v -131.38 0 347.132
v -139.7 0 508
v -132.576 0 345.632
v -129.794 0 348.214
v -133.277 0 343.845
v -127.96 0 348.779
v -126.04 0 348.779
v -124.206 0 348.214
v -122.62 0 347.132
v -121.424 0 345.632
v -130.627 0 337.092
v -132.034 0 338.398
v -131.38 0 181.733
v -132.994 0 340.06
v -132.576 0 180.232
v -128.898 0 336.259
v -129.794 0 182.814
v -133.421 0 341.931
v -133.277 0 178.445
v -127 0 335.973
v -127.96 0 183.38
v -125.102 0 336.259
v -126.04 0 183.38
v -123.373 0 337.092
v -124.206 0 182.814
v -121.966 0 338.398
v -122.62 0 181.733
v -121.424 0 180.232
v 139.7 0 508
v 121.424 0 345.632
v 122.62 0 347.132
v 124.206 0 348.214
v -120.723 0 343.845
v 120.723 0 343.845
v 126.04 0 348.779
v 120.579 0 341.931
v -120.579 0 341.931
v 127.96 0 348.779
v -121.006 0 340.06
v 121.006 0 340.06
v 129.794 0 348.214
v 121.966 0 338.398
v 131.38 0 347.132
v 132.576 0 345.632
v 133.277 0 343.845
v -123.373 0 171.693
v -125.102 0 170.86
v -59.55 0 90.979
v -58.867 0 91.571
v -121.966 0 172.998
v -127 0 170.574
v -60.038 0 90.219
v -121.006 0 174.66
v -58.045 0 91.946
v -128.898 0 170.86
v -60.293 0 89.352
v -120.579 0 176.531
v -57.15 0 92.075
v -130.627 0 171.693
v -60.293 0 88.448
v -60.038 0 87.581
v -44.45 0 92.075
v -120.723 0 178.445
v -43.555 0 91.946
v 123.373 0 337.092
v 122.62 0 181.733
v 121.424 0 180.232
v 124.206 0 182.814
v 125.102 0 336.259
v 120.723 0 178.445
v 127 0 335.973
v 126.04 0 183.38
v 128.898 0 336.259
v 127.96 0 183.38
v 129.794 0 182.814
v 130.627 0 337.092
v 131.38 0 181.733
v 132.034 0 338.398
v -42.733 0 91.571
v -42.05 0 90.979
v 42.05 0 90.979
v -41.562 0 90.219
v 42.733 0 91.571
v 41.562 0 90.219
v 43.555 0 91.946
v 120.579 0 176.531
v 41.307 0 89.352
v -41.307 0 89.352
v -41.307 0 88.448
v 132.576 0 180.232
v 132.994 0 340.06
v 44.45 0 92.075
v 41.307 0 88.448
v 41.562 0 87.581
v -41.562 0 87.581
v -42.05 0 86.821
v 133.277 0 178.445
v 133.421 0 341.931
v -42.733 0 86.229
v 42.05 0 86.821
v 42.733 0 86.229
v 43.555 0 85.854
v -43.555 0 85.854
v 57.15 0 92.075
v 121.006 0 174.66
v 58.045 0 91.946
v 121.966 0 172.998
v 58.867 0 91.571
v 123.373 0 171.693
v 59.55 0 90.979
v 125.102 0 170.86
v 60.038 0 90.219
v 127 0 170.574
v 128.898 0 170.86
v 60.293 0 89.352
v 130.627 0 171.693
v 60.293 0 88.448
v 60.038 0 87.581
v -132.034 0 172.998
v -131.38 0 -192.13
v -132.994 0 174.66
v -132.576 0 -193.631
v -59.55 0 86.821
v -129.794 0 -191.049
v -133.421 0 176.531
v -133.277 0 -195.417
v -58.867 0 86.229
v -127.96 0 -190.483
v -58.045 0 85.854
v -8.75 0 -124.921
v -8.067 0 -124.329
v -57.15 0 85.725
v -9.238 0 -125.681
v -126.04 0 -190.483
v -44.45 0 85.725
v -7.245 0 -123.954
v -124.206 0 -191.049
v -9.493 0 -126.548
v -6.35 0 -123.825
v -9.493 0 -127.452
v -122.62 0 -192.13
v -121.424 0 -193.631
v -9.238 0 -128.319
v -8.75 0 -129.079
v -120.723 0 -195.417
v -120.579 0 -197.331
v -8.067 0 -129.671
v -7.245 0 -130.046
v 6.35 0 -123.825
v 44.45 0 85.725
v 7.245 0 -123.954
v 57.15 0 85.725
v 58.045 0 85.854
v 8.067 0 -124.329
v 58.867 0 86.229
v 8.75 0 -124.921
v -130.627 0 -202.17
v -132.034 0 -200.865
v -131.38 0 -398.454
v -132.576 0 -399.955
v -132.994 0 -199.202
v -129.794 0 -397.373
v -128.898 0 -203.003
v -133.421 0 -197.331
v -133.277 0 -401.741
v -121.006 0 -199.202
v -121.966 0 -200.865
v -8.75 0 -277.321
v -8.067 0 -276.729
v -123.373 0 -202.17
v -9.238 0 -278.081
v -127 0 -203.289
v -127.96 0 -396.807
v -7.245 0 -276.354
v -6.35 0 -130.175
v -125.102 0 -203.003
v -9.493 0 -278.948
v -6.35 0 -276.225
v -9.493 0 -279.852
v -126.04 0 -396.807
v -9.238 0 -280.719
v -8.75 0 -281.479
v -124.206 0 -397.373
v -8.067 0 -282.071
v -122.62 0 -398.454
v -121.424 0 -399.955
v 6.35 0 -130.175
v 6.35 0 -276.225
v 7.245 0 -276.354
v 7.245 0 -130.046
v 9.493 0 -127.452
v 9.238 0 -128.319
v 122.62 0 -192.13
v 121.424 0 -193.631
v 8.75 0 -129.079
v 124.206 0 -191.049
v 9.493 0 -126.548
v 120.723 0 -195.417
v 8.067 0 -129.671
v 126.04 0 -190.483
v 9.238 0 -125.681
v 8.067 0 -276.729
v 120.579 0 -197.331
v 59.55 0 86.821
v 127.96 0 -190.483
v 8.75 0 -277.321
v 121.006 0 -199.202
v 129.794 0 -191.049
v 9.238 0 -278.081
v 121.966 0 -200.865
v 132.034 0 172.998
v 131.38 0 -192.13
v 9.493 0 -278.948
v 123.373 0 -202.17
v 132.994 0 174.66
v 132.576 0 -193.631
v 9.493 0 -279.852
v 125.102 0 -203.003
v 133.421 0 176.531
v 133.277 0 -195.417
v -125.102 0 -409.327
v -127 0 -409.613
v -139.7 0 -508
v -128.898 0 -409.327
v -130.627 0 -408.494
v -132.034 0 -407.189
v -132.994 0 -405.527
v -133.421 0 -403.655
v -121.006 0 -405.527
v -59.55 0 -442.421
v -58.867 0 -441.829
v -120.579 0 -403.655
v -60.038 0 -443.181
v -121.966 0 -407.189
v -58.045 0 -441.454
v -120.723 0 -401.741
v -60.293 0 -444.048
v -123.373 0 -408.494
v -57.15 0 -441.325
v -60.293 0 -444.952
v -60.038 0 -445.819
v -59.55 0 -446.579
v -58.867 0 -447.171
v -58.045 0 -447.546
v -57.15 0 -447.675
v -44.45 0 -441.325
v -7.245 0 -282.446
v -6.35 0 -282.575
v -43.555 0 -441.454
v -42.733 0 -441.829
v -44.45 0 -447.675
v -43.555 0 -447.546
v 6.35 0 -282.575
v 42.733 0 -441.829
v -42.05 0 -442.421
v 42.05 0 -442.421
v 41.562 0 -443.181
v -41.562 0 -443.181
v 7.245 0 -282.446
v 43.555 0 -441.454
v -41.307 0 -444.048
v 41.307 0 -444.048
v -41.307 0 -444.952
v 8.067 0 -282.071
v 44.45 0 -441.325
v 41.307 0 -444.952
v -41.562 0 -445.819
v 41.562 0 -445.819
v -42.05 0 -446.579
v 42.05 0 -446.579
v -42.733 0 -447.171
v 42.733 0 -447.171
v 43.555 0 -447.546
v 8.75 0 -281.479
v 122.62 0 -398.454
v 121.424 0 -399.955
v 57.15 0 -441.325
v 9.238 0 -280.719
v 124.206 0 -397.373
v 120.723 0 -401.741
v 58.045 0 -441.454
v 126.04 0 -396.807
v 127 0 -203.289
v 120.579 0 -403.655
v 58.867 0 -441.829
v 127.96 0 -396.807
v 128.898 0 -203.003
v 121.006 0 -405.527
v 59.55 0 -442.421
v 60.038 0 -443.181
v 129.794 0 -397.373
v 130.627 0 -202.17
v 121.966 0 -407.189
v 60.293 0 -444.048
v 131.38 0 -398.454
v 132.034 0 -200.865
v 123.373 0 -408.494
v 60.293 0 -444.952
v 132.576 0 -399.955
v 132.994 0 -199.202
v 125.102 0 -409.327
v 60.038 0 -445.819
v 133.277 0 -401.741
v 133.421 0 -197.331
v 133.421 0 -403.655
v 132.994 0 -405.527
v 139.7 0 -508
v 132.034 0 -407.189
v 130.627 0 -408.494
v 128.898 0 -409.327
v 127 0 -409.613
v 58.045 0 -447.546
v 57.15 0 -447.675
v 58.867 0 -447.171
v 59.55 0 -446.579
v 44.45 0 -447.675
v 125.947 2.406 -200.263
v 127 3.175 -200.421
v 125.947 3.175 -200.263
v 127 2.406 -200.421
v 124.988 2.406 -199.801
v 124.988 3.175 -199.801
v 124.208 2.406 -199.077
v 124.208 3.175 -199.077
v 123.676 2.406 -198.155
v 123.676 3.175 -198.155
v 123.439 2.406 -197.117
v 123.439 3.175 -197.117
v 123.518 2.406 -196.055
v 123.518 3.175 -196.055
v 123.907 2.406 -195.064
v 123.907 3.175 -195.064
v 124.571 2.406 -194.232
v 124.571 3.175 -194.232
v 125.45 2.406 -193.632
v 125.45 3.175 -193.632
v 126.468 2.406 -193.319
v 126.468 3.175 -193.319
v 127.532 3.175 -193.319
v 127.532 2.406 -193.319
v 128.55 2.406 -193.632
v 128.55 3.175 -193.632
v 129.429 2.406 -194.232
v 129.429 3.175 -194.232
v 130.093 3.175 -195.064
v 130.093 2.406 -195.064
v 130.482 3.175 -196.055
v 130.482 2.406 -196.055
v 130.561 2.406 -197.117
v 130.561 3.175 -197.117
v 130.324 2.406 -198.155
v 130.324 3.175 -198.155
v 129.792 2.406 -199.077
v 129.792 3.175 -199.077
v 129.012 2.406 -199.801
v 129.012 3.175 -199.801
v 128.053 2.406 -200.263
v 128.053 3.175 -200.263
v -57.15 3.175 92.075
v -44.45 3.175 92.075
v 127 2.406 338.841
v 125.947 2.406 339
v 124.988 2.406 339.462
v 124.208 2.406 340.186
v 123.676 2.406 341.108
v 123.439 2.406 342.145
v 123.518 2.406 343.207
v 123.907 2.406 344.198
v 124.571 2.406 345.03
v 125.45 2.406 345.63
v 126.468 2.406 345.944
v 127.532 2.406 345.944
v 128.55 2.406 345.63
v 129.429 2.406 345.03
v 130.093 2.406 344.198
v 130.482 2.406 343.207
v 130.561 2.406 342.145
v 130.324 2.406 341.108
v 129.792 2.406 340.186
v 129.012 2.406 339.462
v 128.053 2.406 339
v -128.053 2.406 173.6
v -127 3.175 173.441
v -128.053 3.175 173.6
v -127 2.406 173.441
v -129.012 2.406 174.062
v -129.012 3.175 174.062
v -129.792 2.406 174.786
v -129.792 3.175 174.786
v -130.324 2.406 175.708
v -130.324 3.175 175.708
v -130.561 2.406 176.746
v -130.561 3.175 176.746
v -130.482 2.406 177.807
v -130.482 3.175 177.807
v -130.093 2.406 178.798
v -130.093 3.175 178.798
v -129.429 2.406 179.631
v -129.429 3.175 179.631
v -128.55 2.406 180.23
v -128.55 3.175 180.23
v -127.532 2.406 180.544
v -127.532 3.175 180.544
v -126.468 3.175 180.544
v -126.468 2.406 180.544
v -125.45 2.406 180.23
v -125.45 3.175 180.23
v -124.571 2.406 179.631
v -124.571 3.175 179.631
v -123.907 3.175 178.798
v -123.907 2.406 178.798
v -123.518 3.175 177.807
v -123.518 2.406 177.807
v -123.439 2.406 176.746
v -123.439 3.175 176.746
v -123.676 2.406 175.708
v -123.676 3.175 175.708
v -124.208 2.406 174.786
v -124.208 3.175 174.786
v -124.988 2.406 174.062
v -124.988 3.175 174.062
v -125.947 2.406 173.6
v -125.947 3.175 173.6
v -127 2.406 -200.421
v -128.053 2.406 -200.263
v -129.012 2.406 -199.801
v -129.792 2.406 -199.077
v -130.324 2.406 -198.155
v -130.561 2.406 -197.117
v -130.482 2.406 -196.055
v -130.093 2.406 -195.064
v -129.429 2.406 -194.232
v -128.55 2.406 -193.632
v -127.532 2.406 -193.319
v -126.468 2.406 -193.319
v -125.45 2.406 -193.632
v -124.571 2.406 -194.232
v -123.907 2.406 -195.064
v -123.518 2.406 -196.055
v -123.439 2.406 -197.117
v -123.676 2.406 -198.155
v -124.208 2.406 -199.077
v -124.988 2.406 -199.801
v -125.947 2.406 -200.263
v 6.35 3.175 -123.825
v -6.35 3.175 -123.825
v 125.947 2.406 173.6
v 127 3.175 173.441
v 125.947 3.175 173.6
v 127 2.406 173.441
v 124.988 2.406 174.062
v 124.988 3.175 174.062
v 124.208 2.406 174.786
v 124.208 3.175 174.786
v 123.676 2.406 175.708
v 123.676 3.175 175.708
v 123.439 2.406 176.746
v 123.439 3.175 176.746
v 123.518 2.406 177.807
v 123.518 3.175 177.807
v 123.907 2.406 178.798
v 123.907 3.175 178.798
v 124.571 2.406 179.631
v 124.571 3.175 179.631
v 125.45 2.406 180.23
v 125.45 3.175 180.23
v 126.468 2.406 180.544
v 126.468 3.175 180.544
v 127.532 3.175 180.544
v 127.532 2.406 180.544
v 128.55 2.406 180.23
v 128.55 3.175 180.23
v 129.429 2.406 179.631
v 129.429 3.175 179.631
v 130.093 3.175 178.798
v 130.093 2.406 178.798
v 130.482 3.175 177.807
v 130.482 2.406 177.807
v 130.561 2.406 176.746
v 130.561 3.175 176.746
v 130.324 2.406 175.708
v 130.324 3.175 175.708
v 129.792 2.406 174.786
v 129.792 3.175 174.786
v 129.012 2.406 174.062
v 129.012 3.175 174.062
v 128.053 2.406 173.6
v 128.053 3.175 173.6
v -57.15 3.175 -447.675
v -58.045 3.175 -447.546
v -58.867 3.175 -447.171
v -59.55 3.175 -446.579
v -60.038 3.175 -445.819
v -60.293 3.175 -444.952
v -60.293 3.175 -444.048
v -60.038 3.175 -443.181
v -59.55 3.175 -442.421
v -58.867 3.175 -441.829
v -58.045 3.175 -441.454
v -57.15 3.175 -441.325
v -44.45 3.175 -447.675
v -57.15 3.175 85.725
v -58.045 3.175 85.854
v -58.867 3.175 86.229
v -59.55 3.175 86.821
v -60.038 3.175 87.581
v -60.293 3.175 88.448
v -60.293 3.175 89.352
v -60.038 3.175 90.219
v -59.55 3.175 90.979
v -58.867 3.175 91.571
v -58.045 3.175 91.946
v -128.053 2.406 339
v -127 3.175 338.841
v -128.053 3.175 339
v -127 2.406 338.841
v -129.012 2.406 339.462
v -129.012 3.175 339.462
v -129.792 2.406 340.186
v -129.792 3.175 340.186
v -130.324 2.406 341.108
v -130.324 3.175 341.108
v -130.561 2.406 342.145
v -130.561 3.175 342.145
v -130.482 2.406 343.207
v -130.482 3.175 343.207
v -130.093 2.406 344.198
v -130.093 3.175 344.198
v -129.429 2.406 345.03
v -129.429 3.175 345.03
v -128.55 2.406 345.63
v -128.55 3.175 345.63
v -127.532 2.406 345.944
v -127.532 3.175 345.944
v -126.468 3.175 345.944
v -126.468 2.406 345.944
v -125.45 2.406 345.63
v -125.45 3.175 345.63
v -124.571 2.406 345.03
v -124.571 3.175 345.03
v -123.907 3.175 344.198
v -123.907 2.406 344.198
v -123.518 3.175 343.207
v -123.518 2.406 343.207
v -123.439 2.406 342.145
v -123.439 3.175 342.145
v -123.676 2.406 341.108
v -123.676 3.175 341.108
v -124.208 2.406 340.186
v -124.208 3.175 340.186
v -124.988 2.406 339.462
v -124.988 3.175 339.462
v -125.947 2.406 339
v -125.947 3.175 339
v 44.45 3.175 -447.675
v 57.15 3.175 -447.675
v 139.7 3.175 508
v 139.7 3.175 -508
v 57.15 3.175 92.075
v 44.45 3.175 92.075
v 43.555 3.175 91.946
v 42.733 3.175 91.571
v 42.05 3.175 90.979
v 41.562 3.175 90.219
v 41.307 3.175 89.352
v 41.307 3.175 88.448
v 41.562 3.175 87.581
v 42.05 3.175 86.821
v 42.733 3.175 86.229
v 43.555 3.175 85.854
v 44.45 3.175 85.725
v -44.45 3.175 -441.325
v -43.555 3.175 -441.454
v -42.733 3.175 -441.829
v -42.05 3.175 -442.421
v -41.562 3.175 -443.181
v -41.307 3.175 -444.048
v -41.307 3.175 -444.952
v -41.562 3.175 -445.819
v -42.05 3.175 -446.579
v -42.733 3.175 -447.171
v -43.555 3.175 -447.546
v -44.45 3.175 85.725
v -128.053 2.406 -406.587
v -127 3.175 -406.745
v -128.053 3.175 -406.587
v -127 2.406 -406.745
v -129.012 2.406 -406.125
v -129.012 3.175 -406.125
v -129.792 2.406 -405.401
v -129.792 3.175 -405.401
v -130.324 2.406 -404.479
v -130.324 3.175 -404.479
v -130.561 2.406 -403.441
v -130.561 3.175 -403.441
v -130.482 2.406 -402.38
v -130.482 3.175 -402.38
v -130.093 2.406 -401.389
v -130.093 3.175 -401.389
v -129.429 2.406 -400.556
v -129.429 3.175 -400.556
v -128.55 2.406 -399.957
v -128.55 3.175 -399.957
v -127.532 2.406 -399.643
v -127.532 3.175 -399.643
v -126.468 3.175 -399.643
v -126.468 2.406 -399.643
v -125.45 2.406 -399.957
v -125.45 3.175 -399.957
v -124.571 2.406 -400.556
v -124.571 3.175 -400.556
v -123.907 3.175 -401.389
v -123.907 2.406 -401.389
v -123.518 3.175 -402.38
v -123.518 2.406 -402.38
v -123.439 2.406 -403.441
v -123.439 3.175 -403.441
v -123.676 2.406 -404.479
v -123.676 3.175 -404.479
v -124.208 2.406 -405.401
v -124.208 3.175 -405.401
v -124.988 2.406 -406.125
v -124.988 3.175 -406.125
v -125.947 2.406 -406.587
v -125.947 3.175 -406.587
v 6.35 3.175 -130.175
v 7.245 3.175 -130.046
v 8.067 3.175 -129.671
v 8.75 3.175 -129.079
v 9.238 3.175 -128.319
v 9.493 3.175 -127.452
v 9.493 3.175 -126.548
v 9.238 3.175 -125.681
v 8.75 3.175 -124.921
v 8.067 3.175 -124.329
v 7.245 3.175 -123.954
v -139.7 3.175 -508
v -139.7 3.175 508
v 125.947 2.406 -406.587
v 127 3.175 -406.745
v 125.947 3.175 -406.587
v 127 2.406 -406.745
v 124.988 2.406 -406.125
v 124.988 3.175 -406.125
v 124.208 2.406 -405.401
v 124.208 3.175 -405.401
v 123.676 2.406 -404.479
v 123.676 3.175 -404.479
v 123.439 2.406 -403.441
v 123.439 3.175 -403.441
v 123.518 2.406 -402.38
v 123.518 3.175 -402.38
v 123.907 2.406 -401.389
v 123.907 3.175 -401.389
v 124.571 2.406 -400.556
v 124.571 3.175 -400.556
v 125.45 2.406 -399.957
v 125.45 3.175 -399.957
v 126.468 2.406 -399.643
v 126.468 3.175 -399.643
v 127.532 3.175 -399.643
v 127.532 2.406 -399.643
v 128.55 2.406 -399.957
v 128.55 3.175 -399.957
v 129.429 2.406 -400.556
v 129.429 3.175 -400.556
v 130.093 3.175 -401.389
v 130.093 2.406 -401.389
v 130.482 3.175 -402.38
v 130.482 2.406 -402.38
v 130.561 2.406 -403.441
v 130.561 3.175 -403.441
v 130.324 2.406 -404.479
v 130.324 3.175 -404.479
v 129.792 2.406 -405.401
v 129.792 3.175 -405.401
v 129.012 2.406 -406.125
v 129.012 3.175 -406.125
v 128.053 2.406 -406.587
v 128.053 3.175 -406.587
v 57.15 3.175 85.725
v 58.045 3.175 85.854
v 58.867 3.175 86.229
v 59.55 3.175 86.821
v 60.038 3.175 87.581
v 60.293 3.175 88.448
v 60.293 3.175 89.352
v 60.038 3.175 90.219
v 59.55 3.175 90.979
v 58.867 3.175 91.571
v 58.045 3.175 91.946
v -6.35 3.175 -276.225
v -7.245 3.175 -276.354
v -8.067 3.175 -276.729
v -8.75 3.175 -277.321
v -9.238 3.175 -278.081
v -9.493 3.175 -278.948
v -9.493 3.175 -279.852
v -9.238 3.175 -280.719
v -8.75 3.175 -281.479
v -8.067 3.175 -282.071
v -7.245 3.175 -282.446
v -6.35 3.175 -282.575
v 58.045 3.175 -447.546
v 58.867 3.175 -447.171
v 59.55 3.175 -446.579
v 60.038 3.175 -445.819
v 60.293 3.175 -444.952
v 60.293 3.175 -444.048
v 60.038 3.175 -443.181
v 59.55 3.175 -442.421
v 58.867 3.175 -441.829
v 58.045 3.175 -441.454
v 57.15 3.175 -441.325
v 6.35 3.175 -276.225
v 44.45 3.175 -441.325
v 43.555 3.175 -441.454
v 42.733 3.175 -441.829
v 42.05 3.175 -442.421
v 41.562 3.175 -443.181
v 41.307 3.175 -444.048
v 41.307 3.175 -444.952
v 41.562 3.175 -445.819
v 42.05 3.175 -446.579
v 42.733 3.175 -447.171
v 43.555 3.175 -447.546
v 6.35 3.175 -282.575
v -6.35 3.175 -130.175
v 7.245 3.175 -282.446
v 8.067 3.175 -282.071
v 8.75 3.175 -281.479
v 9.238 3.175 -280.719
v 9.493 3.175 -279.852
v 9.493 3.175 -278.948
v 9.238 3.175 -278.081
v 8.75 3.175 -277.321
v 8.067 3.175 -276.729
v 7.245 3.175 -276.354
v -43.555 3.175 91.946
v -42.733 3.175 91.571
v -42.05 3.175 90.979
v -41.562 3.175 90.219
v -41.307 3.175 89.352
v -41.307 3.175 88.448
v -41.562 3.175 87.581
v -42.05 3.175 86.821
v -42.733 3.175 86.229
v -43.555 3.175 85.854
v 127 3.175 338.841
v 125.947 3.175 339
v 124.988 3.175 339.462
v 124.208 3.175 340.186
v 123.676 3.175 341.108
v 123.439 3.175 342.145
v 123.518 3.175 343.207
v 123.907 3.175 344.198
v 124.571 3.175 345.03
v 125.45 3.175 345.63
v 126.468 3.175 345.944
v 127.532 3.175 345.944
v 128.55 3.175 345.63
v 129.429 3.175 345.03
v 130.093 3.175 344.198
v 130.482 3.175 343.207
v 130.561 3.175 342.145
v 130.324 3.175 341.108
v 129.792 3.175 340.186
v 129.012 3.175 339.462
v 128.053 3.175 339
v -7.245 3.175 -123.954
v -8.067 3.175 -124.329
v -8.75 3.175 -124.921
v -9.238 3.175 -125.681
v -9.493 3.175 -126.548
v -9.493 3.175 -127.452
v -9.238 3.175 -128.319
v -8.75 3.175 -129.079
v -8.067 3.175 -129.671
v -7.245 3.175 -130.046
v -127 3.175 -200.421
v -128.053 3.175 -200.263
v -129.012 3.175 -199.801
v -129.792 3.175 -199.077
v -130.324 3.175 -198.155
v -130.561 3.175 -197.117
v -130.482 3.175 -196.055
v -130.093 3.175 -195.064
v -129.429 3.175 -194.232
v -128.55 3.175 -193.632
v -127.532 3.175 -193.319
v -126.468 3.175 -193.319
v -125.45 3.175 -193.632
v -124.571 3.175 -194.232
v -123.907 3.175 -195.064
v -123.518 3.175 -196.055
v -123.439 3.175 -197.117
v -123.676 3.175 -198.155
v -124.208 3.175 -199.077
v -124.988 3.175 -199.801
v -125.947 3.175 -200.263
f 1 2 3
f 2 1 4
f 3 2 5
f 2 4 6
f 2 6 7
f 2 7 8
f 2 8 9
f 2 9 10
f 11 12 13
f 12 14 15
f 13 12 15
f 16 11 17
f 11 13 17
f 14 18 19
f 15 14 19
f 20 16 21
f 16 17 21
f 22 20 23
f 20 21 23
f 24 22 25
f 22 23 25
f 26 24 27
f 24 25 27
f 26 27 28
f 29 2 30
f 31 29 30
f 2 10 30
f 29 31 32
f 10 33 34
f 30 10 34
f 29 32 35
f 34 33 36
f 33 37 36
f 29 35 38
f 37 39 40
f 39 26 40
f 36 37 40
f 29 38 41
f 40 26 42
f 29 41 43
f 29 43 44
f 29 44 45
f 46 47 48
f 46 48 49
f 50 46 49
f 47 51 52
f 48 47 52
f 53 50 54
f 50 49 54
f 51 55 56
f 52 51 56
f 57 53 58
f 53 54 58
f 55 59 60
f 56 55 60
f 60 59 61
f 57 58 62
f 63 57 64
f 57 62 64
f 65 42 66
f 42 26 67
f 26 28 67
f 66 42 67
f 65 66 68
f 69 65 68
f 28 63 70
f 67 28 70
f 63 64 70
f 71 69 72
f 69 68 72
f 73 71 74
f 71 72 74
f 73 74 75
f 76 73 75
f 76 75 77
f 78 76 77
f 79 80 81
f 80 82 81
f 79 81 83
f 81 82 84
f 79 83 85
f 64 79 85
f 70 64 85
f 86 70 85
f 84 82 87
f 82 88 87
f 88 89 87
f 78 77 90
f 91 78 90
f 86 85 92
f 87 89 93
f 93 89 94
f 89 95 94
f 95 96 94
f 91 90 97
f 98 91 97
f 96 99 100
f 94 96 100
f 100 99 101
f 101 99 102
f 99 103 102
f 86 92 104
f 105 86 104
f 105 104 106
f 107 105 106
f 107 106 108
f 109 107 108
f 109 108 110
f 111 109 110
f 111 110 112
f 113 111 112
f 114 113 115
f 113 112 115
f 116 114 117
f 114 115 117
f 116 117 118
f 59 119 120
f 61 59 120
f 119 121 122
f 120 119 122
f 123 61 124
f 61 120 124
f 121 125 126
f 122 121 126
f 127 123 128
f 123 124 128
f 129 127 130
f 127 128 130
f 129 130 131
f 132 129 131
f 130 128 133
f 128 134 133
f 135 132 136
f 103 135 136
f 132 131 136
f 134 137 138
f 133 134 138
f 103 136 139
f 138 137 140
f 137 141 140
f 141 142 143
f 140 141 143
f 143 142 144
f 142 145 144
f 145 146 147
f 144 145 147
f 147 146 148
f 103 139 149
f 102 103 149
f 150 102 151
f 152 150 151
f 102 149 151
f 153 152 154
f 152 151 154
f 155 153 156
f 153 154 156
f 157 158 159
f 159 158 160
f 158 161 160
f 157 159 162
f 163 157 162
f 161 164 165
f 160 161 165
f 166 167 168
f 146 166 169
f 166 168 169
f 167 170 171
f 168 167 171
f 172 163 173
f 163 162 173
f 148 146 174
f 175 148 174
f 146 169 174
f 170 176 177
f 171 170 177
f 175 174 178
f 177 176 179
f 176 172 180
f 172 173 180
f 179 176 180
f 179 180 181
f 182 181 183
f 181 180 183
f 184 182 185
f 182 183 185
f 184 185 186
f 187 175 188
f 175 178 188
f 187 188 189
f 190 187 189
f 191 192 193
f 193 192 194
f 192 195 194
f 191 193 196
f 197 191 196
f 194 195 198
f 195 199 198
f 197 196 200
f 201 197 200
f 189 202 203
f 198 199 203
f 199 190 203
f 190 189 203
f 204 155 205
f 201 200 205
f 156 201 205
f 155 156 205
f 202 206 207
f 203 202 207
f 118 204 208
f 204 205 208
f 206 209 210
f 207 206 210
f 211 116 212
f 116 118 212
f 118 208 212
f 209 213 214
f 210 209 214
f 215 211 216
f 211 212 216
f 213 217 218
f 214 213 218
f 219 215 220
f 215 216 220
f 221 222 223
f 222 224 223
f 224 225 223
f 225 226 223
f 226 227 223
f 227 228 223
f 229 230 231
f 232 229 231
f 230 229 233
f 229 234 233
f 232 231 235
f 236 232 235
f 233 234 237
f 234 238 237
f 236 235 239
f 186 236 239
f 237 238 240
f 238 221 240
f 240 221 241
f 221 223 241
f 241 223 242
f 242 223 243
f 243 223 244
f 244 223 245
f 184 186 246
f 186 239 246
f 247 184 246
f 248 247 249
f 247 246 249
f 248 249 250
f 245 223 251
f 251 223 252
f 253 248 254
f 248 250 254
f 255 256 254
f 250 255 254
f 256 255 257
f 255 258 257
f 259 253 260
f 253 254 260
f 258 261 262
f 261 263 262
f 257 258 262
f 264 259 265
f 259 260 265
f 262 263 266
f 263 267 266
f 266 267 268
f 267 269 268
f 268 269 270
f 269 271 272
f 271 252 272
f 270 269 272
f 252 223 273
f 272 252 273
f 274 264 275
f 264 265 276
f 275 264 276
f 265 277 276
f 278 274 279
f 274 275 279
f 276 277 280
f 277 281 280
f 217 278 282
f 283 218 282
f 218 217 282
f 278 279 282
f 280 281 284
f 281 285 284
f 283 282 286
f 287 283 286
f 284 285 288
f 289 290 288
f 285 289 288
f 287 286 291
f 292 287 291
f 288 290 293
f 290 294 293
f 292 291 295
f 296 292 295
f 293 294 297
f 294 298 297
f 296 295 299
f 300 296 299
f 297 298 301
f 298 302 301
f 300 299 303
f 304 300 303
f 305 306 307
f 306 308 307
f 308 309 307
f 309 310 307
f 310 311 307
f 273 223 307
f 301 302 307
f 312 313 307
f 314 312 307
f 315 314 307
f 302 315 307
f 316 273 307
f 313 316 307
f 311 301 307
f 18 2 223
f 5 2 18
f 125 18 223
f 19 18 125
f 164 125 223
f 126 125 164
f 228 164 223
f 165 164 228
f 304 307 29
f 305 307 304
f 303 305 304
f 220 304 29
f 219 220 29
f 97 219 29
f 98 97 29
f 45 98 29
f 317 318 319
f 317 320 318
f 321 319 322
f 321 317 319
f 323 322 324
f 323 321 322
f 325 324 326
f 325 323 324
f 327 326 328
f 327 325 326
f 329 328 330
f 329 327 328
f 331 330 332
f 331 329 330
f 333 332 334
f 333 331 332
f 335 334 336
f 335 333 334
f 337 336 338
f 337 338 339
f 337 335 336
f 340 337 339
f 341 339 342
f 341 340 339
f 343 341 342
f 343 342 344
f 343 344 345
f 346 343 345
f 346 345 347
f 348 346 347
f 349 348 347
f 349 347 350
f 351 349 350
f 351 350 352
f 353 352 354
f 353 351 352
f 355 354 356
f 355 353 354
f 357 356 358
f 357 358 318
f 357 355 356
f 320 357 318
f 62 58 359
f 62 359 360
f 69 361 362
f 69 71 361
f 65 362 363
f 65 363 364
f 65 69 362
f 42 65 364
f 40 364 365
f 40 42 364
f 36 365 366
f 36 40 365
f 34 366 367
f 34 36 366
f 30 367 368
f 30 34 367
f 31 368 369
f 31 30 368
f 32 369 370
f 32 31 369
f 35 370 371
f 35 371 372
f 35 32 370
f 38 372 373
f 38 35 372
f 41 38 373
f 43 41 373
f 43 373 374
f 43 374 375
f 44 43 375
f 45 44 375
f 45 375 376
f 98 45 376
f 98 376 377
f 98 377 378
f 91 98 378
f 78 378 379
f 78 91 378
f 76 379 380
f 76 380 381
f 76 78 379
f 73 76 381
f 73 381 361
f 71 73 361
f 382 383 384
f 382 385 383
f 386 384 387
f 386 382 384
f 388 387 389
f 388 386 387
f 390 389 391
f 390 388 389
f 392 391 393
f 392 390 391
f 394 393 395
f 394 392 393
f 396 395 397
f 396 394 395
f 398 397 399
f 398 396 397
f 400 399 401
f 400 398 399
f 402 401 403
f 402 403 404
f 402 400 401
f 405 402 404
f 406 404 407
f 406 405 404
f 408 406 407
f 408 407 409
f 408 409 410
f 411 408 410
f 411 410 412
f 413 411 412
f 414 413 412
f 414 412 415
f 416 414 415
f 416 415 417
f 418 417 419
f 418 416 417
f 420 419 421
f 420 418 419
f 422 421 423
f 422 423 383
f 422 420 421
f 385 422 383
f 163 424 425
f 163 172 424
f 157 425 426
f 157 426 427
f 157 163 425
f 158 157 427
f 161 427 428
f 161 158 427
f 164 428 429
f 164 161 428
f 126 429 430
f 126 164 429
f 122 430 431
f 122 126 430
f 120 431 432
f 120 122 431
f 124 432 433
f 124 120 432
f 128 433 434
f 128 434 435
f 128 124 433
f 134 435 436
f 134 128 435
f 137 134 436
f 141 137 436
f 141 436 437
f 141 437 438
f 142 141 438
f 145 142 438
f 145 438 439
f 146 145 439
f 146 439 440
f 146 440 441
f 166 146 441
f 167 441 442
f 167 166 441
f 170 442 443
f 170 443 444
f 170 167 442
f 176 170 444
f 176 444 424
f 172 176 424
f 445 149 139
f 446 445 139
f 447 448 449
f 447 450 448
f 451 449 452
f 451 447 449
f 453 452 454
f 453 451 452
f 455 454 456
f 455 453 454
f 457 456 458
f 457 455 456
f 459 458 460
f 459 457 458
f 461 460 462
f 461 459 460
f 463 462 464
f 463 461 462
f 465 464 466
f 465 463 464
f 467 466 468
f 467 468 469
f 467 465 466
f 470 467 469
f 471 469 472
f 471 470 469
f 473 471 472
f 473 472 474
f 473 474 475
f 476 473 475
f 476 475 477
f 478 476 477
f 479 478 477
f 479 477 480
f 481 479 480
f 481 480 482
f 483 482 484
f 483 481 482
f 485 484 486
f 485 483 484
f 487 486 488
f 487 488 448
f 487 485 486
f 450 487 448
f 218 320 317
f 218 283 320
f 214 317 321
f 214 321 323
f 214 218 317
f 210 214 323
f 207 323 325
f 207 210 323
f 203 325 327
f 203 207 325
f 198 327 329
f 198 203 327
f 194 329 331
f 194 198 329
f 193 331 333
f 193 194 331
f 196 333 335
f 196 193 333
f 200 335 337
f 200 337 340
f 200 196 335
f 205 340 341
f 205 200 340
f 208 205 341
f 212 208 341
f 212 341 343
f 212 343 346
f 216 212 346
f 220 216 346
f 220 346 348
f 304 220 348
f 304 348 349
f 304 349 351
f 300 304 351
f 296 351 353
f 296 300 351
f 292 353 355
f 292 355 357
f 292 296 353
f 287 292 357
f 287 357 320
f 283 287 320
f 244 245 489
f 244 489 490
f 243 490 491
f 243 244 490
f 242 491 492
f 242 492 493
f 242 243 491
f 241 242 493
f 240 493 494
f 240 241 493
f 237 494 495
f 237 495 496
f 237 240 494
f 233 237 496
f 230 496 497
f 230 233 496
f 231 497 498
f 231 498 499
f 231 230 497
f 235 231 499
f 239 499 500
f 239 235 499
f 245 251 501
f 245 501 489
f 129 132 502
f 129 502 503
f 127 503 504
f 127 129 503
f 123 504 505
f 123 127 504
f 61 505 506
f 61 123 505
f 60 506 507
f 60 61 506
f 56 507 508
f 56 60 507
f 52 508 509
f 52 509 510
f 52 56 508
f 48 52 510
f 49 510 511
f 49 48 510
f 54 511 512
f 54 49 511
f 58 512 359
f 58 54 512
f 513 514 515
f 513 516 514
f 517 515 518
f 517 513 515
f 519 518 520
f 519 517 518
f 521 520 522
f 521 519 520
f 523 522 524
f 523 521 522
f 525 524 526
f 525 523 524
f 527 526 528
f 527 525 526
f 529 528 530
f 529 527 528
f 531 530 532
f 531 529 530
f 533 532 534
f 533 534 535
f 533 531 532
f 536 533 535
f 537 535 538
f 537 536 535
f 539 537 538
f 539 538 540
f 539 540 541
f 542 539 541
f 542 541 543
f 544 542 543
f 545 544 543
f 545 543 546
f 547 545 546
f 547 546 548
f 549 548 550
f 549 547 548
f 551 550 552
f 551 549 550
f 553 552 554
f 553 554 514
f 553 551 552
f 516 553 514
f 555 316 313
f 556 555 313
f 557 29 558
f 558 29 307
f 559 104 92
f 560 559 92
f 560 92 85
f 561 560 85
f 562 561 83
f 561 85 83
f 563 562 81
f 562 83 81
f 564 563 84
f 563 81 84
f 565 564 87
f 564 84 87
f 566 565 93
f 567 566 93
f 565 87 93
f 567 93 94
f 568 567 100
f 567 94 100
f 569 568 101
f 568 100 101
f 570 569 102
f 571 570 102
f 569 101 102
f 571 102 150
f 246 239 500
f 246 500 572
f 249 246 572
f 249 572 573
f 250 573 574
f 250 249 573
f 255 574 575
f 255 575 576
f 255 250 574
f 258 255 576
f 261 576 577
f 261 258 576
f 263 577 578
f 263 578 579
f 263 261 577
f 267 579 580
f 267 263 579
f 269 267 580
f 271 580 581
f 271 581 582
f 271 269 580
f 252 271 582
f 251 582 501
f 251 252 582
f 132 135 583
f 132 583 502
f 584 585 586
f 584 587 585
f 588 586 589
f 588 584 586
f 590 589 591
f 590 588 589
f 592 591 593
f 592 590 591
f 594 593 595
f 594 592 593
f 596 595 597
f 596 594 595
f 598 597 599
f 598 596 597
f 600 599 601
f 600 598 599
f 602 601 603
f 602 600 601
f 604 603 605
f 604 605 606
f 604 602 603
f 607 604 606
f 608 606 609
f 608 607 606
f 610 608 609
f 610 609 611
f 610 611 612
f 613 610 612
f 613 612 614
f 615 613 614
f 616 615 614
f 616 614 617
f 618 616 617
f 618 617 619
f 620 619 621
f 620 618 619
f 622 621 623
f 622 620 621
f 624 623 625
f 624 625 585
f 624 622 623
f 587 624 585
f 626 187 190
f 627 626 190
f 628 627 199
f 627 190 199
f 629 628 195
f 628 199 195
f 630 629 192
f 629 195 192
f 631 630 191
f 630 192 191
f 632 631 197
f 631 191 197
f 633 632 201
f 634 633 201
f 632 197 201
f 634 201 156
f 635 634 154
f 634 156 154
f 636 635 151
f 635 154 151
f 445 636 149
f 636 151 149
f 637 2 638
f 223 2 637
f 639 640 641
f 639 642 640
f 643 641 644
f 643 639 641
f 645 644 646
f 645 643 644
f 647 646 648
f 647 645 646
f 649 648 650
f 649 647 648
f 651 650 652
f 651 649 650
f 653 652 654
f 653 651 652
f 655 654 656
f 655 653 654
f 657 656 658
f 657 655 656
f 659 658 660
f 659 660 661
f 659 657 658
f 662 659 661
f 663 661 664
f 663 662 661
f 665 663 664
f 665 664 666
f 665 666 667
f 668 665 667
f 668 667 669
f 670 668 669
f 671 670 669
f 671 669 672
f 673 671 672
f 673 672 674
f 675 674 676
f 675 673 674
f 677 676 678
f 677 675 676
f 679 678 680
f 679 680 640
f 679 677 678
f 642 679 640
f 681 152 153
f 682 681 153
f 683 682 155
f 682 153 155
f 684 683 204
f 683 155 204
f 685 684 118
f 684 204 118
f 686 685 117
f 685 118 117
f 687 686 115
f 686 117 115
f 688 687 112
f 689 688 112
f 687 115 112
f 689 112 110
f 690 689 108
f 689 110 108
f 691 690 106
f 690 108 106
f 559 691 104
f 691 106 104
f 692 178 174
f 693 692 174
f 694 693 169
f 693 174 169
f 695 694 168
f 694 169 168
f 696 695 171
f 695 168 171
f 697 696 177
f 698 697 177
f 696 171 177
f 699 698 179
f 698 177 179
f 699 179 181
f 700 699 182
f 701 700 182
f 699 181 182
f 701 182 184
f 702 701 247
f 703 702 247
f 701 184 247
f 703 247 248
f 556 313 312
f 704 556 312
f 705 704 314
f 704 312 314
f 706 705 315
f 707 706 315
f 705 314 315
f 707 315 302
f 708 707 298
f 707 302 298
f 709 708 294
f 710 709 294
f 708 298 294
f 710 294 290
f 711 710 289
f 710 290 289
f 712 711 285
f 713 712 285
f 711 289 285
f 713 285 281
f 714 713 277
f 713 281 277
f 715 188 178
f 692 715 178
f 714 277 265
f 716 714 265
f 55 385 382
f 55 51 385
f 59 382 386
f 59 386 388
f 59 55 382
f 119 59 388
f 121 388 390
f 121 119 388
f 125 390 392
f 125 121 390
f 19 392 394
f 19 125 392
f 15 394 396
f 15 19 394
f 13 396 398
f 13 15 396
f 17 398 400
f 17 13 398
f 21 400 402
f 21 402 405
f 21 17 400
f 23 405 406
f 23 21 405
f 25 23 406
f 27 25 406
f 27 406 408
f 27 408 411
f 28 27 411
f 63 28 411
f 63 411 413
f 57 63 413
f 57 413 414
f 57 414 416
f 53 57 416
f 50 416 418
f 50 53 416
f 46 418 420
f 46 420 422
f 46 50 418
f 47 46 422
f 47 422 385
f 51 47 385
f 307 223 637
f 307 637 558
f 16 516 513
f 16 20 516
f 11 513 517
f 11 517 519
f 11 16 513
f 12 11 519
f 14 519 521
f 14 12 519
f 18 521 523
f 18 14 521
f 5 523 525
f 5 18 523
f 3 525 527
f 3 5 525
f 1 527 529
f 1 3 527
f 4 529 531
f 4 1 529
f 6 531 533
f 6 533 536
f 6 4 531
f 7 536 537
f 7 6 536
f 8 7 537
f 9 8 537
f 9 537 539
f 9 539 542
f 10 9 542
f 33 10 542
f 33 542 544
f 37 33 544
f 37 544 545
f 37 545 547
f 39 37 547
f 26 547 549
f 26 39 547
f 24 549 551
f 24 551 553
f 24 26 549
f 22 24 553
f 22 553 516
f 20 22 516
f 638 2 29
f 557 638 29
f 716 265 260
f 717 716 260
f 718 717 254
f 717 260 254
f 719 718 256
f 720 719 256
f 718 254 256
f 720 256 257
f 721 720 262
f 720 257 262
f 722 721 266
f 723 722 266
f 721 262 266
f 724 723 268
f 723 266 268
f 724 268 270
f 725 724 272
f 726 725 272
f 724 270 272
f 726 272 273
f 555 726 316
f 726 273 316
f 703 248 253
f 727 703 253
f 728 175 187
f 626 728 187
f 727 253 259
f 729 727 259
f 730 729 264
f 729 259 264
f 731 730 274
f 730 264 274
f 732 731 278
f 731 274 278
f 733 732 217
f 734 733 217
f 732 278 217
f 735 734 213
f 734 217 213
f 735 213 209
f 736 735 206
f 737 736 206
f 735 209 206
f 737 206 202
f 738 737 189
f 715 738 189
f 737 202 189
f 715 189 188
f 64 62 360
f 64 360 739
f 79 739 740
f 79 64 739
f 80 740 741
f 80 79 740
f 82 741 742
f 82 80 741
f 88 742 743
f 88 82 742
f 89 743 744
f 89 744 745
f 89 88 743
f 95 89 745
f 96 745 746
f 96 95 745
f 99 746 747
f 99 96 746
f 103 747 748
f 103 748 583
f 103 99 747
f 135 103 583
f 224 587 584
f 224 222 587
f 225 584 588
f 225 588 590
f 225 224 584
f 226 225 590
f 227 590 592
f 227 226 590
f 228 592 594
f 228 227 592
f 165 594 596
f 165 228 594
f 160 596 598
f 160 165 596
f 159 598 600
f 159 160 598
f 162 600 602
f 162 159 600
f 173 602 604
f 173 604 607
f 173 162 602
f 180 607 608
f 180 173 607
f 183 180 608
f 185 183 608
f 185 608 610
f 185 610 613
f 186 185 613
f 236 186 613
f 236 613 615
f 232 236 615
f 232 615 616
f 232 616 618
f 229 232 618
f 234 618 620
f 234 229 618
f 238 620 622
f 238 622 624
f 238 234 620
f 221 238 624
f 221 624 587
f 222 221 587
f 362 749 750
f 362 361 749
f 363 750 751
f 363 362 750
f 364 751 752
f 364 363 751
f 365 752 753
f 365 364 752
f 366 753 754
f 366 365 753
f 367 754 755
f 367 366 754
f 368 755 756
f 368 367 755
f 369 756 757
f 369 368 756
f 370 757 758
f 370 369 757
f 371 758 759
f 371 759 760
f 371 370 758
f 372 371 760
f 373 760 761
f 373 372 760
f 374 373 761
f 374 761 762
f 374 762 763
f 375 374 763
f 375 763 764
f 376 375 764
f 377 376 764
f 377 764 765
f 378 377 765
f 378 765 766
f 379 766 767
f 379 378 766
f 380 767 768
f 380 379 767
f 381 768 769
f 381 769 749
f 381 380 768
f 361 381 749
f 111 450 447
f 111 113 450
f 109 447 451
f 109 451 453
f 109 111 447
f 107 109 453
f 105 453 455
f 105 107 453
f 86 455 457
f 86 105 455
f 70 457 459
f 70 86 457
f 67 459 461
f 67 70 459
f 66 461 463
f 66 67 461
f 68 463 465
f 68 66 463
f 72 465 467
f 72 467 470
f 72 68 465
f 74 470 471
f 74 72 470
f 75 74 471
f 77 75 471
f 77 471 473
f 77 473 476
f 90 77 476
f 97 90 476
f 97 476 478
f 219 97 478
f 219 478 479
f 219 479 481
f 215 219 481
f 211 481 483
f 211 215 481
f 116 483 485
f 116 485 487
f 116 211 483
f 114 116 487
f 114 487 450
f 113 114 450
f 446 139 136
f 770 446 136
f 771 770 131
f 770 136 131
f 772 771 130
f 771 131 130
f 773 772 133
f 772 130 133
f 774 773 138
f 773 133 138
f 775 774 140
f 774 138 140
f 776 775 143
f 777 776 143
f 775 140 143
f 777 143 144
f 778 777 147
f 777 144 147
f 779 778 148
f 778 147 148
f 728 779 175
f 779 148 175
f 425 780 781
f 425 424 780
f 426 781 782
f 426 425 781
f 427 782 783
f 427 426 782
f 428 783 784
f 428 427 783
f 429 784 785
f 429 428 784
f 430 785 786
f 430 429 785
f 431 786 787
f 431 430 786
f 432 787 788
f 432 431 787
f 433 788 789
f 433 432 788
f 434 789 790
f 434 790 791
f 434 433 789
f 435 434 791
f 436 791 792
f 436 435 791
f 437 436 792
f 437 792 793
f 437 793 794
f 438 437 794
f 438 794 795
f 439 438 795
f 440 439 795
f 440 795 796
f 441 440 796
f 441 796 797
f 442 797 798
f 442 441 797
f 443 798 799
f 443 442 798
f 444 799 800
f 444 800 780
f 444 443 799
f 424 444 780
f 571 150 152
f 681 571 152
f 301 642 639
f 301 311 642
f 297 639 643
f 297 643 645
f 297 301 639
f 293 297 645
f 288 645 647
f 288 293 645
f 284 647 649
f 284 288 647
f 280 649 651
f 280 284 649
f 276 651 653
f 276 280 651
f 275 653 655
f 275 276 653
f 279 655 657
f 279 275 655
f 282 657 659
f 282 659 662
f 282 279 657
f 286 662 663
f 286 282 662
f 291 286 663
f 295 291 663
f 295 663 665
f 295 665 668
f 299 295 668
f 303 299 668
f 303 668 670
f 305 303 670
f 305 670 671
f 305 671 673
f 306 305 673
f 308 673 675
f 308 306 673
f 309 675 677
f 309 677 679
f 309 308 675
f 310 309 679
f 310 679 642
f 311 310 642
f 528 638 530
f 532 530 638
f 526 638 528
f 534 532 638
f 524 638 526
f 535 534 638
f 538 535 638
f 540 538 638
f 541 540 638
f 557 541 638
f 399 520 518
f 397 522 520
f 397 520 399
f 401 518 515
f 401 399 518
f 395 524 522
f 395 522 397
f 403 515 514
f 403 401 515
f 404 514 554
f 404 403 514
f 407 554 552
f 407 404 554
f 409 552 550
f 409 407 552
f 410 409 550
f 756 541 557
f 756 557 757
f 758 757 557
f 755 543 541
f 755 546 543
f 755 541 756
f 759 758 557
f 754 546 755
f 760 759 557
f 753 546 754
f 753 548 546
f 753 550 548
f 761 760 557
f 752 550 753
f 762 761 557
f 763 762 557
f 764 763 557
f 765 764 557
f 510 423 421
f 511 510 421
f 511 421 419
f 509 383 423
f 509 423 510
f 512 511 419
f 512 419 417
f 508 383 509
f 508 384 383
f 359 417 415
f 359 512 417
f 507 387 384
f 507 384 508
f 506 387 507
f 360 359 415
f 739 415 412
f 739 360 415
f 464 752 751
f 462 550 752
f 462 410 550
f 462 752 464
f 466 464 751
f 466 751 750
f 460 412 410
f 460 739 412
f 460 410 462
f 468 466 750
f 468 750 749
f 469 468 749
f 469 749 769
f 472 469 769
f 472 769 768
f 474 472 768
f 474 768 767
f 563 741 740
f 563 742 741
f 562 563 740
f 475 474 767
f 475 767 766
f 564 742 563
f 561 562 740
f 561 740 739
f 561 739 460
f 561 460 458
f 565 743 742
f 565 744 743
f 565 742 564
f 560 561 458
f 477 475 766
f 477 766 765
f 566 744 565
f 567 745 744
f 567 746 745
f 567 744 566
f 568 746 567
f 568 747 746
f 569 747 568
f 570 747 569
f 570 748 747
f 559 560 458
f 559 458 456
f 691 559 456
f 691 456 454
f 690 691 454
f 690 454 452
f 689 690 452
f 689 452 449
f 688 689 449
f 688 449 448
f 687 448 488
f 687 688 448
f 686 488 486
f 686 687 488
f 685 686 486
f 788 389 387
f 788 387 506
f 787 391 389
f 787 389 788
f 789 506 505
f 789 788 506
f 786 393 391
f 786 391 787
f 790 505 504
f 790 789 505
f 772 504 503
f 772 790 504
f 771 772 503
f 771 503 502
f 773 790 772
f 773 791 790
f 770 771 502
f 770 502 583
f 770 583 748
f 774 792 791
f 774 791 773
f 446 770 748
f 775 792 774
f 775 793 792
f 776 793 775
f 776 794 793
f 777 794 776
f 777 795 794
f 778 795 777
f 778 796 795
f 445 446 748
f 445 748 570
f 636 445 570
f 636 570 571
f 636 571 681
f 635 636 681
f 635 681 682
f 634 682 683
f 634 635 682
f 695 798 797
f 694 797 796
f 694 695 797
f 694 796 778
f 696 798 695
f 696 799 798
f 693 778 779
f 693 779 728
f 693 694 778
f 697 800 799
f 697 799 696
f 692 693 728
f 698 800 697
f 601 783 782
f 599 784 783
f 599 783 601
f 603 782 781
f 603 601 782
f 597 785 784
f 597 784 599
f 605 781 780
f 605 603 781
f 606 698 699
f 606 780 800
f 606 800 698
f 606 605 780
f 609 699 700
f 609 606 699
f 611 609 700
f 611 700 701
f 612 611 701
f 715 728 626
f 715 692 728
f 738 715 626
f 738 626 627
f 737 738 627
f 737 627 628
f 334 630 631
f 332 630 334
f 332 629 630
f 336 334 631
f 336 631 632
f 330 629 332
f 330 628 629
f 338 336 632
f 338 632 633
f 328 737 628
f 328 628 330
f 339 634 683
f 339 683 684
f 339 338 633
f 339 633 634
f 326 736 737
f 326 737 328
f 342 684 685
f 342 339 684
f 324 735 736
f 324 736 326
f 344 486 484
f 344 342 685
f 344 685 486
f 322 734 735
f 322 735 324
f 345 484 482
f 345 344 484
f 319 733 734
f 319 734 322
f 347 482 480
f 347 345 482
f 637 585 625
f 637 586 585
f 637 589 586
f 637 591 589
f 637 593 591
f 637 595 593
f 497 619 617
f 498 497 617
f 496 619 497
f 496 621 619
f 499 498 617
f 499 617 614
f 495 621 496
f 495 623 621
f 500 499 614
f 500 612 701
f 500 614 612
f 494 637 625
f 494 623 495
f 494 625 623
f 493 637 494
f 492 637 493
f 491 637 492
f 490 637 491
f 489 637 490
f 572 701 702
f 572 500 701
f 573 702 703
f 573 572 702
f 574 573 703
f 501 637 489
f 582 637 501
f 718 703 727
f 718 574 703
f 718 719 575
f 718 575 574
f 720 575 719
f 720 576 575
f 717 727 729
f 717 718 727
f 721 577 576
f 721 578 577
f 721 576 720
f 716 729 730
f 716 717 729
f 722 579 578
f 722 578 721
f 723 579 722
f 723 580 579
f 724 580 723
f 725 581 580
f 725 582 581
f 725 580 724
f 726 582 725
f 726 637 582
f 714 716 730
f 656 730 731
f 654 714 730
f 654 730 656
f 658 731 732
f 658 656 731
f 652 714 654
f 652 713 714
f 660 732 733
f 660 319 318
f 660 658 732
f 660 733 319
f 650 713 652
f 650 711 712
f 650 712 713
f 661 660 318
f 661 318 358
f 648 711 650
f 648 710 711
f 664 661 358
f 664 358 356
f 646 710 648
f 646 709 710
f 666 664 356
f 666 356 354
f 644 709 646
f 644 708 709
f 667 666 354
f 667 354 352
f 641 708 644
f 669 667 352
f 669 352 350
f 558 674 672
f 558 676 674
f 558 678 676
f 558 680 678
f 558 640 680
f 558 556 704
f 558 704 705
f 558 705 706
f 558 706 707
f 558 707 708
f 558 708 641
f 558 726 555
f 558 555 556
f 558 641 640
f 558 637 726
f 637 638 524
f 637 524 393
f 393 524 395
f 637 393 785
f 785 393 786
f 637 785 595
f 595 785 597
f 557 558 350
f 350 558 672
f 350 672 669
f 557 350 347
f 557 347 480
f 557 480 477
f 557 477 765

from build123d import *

# Parameters (mm, degrees)
SKETCH1_W                                   = 279.4
SKETCH1_H                                   = 1016
BOSS_EXTRUDE1_DEPTH                         = 3.175
CSK_FOR_1_4_FLAT_HEAD_MACHINE_SCREW_2_COUNT = 2
CSK_FOR_1_4_FLAT_HEAD_MACHINE_SCREW_2_PITCH = 254
CSK_FOR_1_4_FLAT_HEAD_MACHINE_SCREW_3_COUNT = 2
CSK_FOR_1_4_FLAT_HEAD_MACHINE_SCREW_3_PITCH = 303.105703305
CSK_FOR_1_4_FLAT_HEAD_MACHINE_SCREW_4_COUNT = 2
CSK_FOR_1_4_FLAT_HEAD_MACHINE_SCREW_4_PITCH = 165.39972
CSK_FOR_1_4_FLAT_HEAD_MACHINE_SCREW_5_COUNT = 2
CSK_FOR_1_4_FLAT_HEAD_MACHINE_SCREW_5_PITCH = 539.26232
CSK_FOR_1_4_FLAT_HEAD_MACHINE_SCREW_6_COUNT = 2
CSK_FOR_1_4_FLAT_HEAD_MACHINE_SCREW_6_PITCH = 596.087115925
CSK_FOR_1_4_FLAT_HEAD_MACHINE_SCREW_7_COUNT = 2
CSK_FOR_1_4_FLAT_HEAD_MACHINE_SCREW_7_PITCH = 787.664432868
CSK_FOR_1_4_FLAT_HEAD_MACHINE_SCREW_8_COUNT = 2
CSK_FOR_1_4_FLAT_HEAD_MACHINE_SCREW_8_PITCH = 745.58652


with BuildPart() as part:
    # Sketch1 → Boss-Extrude1 (new body)
    with BuildSketch(Plane(origin=(0, 0, 0), x_dir=(1, 0, 0), z_dir=(0, 1, 0))):
        Rectangle(SKETCH1_W, SKETCH1_H)
        with BuildLine():
            Line((44.45, -85.725), (57.15, -85.725))
            ThreePointArc((57.15, -85.725), (60.325, -88.9), (57.15, -92.075))
            Line((57.15, -92.075), (44.45, -92.075))
            ThreePointArc((44.45, -92.075), (41.275, -88.9), (44.45, -85.725))
        make_face(mode=Mode.SUBTRACT)
        with BuildLine():
            Line((-44.45, -85.725), (-57.15, -85.725))
            ThreePointArc((-57.15, -85.725), (-60.325, -88.9), (-57.15, -92.075))
            Line((-57.15, -92.075), (-44.45, -92.075))
            ThreePointArc((-44.45, -92.075), (-41.275, -88.9), (-44.45, -85.725))
        make_face(mode=Mode.SUBTRACT)
        with BuildLine():
            Line((57.15, 441.325), (44.45, 441.325))
            ThreePointArc((44.45, 441.325), (41.275, 444.5), (44.45, 447.675))
            Line((44.45, 447.675), (57.15, 447.675))
            ThreePointArc((57.15, 447.675), (60.325, 444.5), (57.15, 441.325))
        make_face(mode=Mode.SUBTRACT)
        with BuildLine():
            Line((-57.15, 441.325), (-44.45, 441.325))
            ThreePointArc((-44.45, 441.325), (-41.275, 444.5), (-44.45, 447.675))
            Line((-44.45, 447.675), (-57.15, 447.675))
            ThreePointArc((-57.15, 447.675), (-60.325, 444.5), (-57.15, 441.325))
        make_face(mode=Mode.SUBTRACT)
        with BuildLine():
            Line((6.35, 276.225), (-6.35, 276.225))
            ThreePointArc((-6.35, 276.225), (-9.525, 279.4), (-6.35, 282.575))
            Line((-6.35, 282.575), (6.35, 282.575))
            ThreePointArc((6.35, 282.575), (9.525, 279.4), (6.35, 276.225))
        make_face(mode=Mode.SUBTRACT)
        with BuildLine():
            Line((-6.35, 130.175), (6.35, 130.175))
            ThreePointArc((6.35, 130.175), (9.525, 127), (6.35, 123.825))
            Line((6.35, 123.825), (-6.35, 123.825))
            ThreePointArc((-6.35, 123.825), (-9.525, 127), (-6.35, 130.175))
        make_face(mode=Mode.SUBTRACT)
    extrude(amount=BOSS_EXTRUDE1_DEPTH)

    # Sketch5 → CSK for 1/4 Flat Head Machine Screw (100)1 (revolve, cut)
    with BuildSketch(Plane(origin=(-127, 0, 342.41232), x_dir=(0, 0, -1), z_dir=(1, 0, 0))):
        Polygon((0, 0), (0, 3.175), (3.57124, 3.175), (3.57124, 2.406252448), (6.4389, 0), align=None)
    csk_for_1_4_flat_head_machine_screw_100 = revolve(axis=Axis((-127, -6.35, 342.41232), (0, 1, 0)), mode=Mode.SUBTRACT)

    # CSK for 1_4 Flat Head Machine Screw  2: CSK for 1/4 Flat Head Machine Screw (100)1 ×2
    with Locations(*[(i * CSK_FOR_1_4_FLAT_HEAD_MACHINE_SCREW_2_PITCH, 0, 0) for i in range(1, CSK_FOR_1_4_FLAT_HEAD_MACHINE_SCREW_2_COUNT)]):
        add(csk_for_1_4_flat_head_machine_screw_100, mode=Mode.SUBTRACT)

    # CSK for 1_4 Flat Head Machine Screw  3: CSK for 1/4 Flat Head Machine Screw (100)1 ×2
    with Locations(*[Vector(0.8379914901974974, 0, -0.5456832985868064) * (i * CSK_FOR_1_4_FLAT_HEAD_MACHINE_SCREW_3_PITCH) for i in range(1, CSK_FOR_1_4_FLAT_HEAD_MACHINE_SCREW_3_COUNT)]):
        add(csk_for_1_4_flat_head_machine_screw_100, mode=Mode.SUBTRACT)

    # CSK for 1_4 Flat Head Machine Screw  4: CSK for 1/4 Flat Head Machine Screw (100)1 ×2
    with Locations(*[(0, 0, -i * CSK_FOR_1_4_FLAT_HEAD_MACHINE_SCREW_4_PITCH) for i in range(1, CSK_FOR_1_4_FLAT_HEAD_MACHINE_SCREW_4_COUNT)]):
        add(csk_for_1_4_flat_head_machine_screw_100, mode=Mode.SUBTRACT)

    # CSK for 1_4 Flat Head Machine Screw  5: CSK for 1/4 Flat Head Machine Screw (100)1 ×2
    with Locations(*[(0, 0, -i * CSK_FOR_1_4_FLAT_HEAD_MACHINE_SCREW_5_PITCH) for i in range(1, CSK_FOR_1_4_FLAT_HEAD_MACHINE_SCREW_5_COUNT)]):
        add(csk_for_1_4_flat_head_machine_screw_100, mode=Mode.SUBTRACT)

    # CSK for 1_4 Flat Head Machine Screw  6: CSK for 1/4 Flat Head Machine Screw (100)1 ×2
    with Locations(*[Vector(0.4261122128195085, 0, -0.9046703167928425) * (i * CSK_FOR_1_4_FLAT_HEAD_MACHINE_SCREW_6_PITCH) for i in range(1, CSK_FOR_1_4_FLAT_HEAD_MACHINE_SCREW_6_COUNT)]):
        add(csk_for_1_4_flat_head_machine_screw_100, mode=Mode.SUBTRACT)

    # CSK for 1_4 Flat Head Machine Screw  7: CSK for 1/4 Flat Head Machine Screw (100)1 ×2
    with Locations(*[Vector(0.3224723491386537, 0, -0.9465788842146218) * (i * CSK_FOR_1_4_FLAT_HEAD_MACHINE_SCREW_7_PITCH) for i in range(1, CSK_FOR_1_4_FLAT_HEAD_MACHINE_SCREW_7_COUNT)]):
        add(csk_for_1_4_flat_head_machine_screw_100, mode=Mode.SUBTRACT)

    # CSK for 1_4 Flat Head Machine Screw  8: CSK for 1/4 Flat Head Machine Screw (100)1 ×2
    with Locations(*[(0, 0, -i * CSK_FOR_1_4_FLAT_HEAD_MACHINE_SCREW_8_PITCH) for i in range(1, CSK_FOR_1_4_FLAT_HEAD_MACHINE_SCREW_8_COUNT)]):
        add(csk_for_1_4_flat_head_machine_screw_100, mode=Mode.SUBTRACT)


solid = part.part
